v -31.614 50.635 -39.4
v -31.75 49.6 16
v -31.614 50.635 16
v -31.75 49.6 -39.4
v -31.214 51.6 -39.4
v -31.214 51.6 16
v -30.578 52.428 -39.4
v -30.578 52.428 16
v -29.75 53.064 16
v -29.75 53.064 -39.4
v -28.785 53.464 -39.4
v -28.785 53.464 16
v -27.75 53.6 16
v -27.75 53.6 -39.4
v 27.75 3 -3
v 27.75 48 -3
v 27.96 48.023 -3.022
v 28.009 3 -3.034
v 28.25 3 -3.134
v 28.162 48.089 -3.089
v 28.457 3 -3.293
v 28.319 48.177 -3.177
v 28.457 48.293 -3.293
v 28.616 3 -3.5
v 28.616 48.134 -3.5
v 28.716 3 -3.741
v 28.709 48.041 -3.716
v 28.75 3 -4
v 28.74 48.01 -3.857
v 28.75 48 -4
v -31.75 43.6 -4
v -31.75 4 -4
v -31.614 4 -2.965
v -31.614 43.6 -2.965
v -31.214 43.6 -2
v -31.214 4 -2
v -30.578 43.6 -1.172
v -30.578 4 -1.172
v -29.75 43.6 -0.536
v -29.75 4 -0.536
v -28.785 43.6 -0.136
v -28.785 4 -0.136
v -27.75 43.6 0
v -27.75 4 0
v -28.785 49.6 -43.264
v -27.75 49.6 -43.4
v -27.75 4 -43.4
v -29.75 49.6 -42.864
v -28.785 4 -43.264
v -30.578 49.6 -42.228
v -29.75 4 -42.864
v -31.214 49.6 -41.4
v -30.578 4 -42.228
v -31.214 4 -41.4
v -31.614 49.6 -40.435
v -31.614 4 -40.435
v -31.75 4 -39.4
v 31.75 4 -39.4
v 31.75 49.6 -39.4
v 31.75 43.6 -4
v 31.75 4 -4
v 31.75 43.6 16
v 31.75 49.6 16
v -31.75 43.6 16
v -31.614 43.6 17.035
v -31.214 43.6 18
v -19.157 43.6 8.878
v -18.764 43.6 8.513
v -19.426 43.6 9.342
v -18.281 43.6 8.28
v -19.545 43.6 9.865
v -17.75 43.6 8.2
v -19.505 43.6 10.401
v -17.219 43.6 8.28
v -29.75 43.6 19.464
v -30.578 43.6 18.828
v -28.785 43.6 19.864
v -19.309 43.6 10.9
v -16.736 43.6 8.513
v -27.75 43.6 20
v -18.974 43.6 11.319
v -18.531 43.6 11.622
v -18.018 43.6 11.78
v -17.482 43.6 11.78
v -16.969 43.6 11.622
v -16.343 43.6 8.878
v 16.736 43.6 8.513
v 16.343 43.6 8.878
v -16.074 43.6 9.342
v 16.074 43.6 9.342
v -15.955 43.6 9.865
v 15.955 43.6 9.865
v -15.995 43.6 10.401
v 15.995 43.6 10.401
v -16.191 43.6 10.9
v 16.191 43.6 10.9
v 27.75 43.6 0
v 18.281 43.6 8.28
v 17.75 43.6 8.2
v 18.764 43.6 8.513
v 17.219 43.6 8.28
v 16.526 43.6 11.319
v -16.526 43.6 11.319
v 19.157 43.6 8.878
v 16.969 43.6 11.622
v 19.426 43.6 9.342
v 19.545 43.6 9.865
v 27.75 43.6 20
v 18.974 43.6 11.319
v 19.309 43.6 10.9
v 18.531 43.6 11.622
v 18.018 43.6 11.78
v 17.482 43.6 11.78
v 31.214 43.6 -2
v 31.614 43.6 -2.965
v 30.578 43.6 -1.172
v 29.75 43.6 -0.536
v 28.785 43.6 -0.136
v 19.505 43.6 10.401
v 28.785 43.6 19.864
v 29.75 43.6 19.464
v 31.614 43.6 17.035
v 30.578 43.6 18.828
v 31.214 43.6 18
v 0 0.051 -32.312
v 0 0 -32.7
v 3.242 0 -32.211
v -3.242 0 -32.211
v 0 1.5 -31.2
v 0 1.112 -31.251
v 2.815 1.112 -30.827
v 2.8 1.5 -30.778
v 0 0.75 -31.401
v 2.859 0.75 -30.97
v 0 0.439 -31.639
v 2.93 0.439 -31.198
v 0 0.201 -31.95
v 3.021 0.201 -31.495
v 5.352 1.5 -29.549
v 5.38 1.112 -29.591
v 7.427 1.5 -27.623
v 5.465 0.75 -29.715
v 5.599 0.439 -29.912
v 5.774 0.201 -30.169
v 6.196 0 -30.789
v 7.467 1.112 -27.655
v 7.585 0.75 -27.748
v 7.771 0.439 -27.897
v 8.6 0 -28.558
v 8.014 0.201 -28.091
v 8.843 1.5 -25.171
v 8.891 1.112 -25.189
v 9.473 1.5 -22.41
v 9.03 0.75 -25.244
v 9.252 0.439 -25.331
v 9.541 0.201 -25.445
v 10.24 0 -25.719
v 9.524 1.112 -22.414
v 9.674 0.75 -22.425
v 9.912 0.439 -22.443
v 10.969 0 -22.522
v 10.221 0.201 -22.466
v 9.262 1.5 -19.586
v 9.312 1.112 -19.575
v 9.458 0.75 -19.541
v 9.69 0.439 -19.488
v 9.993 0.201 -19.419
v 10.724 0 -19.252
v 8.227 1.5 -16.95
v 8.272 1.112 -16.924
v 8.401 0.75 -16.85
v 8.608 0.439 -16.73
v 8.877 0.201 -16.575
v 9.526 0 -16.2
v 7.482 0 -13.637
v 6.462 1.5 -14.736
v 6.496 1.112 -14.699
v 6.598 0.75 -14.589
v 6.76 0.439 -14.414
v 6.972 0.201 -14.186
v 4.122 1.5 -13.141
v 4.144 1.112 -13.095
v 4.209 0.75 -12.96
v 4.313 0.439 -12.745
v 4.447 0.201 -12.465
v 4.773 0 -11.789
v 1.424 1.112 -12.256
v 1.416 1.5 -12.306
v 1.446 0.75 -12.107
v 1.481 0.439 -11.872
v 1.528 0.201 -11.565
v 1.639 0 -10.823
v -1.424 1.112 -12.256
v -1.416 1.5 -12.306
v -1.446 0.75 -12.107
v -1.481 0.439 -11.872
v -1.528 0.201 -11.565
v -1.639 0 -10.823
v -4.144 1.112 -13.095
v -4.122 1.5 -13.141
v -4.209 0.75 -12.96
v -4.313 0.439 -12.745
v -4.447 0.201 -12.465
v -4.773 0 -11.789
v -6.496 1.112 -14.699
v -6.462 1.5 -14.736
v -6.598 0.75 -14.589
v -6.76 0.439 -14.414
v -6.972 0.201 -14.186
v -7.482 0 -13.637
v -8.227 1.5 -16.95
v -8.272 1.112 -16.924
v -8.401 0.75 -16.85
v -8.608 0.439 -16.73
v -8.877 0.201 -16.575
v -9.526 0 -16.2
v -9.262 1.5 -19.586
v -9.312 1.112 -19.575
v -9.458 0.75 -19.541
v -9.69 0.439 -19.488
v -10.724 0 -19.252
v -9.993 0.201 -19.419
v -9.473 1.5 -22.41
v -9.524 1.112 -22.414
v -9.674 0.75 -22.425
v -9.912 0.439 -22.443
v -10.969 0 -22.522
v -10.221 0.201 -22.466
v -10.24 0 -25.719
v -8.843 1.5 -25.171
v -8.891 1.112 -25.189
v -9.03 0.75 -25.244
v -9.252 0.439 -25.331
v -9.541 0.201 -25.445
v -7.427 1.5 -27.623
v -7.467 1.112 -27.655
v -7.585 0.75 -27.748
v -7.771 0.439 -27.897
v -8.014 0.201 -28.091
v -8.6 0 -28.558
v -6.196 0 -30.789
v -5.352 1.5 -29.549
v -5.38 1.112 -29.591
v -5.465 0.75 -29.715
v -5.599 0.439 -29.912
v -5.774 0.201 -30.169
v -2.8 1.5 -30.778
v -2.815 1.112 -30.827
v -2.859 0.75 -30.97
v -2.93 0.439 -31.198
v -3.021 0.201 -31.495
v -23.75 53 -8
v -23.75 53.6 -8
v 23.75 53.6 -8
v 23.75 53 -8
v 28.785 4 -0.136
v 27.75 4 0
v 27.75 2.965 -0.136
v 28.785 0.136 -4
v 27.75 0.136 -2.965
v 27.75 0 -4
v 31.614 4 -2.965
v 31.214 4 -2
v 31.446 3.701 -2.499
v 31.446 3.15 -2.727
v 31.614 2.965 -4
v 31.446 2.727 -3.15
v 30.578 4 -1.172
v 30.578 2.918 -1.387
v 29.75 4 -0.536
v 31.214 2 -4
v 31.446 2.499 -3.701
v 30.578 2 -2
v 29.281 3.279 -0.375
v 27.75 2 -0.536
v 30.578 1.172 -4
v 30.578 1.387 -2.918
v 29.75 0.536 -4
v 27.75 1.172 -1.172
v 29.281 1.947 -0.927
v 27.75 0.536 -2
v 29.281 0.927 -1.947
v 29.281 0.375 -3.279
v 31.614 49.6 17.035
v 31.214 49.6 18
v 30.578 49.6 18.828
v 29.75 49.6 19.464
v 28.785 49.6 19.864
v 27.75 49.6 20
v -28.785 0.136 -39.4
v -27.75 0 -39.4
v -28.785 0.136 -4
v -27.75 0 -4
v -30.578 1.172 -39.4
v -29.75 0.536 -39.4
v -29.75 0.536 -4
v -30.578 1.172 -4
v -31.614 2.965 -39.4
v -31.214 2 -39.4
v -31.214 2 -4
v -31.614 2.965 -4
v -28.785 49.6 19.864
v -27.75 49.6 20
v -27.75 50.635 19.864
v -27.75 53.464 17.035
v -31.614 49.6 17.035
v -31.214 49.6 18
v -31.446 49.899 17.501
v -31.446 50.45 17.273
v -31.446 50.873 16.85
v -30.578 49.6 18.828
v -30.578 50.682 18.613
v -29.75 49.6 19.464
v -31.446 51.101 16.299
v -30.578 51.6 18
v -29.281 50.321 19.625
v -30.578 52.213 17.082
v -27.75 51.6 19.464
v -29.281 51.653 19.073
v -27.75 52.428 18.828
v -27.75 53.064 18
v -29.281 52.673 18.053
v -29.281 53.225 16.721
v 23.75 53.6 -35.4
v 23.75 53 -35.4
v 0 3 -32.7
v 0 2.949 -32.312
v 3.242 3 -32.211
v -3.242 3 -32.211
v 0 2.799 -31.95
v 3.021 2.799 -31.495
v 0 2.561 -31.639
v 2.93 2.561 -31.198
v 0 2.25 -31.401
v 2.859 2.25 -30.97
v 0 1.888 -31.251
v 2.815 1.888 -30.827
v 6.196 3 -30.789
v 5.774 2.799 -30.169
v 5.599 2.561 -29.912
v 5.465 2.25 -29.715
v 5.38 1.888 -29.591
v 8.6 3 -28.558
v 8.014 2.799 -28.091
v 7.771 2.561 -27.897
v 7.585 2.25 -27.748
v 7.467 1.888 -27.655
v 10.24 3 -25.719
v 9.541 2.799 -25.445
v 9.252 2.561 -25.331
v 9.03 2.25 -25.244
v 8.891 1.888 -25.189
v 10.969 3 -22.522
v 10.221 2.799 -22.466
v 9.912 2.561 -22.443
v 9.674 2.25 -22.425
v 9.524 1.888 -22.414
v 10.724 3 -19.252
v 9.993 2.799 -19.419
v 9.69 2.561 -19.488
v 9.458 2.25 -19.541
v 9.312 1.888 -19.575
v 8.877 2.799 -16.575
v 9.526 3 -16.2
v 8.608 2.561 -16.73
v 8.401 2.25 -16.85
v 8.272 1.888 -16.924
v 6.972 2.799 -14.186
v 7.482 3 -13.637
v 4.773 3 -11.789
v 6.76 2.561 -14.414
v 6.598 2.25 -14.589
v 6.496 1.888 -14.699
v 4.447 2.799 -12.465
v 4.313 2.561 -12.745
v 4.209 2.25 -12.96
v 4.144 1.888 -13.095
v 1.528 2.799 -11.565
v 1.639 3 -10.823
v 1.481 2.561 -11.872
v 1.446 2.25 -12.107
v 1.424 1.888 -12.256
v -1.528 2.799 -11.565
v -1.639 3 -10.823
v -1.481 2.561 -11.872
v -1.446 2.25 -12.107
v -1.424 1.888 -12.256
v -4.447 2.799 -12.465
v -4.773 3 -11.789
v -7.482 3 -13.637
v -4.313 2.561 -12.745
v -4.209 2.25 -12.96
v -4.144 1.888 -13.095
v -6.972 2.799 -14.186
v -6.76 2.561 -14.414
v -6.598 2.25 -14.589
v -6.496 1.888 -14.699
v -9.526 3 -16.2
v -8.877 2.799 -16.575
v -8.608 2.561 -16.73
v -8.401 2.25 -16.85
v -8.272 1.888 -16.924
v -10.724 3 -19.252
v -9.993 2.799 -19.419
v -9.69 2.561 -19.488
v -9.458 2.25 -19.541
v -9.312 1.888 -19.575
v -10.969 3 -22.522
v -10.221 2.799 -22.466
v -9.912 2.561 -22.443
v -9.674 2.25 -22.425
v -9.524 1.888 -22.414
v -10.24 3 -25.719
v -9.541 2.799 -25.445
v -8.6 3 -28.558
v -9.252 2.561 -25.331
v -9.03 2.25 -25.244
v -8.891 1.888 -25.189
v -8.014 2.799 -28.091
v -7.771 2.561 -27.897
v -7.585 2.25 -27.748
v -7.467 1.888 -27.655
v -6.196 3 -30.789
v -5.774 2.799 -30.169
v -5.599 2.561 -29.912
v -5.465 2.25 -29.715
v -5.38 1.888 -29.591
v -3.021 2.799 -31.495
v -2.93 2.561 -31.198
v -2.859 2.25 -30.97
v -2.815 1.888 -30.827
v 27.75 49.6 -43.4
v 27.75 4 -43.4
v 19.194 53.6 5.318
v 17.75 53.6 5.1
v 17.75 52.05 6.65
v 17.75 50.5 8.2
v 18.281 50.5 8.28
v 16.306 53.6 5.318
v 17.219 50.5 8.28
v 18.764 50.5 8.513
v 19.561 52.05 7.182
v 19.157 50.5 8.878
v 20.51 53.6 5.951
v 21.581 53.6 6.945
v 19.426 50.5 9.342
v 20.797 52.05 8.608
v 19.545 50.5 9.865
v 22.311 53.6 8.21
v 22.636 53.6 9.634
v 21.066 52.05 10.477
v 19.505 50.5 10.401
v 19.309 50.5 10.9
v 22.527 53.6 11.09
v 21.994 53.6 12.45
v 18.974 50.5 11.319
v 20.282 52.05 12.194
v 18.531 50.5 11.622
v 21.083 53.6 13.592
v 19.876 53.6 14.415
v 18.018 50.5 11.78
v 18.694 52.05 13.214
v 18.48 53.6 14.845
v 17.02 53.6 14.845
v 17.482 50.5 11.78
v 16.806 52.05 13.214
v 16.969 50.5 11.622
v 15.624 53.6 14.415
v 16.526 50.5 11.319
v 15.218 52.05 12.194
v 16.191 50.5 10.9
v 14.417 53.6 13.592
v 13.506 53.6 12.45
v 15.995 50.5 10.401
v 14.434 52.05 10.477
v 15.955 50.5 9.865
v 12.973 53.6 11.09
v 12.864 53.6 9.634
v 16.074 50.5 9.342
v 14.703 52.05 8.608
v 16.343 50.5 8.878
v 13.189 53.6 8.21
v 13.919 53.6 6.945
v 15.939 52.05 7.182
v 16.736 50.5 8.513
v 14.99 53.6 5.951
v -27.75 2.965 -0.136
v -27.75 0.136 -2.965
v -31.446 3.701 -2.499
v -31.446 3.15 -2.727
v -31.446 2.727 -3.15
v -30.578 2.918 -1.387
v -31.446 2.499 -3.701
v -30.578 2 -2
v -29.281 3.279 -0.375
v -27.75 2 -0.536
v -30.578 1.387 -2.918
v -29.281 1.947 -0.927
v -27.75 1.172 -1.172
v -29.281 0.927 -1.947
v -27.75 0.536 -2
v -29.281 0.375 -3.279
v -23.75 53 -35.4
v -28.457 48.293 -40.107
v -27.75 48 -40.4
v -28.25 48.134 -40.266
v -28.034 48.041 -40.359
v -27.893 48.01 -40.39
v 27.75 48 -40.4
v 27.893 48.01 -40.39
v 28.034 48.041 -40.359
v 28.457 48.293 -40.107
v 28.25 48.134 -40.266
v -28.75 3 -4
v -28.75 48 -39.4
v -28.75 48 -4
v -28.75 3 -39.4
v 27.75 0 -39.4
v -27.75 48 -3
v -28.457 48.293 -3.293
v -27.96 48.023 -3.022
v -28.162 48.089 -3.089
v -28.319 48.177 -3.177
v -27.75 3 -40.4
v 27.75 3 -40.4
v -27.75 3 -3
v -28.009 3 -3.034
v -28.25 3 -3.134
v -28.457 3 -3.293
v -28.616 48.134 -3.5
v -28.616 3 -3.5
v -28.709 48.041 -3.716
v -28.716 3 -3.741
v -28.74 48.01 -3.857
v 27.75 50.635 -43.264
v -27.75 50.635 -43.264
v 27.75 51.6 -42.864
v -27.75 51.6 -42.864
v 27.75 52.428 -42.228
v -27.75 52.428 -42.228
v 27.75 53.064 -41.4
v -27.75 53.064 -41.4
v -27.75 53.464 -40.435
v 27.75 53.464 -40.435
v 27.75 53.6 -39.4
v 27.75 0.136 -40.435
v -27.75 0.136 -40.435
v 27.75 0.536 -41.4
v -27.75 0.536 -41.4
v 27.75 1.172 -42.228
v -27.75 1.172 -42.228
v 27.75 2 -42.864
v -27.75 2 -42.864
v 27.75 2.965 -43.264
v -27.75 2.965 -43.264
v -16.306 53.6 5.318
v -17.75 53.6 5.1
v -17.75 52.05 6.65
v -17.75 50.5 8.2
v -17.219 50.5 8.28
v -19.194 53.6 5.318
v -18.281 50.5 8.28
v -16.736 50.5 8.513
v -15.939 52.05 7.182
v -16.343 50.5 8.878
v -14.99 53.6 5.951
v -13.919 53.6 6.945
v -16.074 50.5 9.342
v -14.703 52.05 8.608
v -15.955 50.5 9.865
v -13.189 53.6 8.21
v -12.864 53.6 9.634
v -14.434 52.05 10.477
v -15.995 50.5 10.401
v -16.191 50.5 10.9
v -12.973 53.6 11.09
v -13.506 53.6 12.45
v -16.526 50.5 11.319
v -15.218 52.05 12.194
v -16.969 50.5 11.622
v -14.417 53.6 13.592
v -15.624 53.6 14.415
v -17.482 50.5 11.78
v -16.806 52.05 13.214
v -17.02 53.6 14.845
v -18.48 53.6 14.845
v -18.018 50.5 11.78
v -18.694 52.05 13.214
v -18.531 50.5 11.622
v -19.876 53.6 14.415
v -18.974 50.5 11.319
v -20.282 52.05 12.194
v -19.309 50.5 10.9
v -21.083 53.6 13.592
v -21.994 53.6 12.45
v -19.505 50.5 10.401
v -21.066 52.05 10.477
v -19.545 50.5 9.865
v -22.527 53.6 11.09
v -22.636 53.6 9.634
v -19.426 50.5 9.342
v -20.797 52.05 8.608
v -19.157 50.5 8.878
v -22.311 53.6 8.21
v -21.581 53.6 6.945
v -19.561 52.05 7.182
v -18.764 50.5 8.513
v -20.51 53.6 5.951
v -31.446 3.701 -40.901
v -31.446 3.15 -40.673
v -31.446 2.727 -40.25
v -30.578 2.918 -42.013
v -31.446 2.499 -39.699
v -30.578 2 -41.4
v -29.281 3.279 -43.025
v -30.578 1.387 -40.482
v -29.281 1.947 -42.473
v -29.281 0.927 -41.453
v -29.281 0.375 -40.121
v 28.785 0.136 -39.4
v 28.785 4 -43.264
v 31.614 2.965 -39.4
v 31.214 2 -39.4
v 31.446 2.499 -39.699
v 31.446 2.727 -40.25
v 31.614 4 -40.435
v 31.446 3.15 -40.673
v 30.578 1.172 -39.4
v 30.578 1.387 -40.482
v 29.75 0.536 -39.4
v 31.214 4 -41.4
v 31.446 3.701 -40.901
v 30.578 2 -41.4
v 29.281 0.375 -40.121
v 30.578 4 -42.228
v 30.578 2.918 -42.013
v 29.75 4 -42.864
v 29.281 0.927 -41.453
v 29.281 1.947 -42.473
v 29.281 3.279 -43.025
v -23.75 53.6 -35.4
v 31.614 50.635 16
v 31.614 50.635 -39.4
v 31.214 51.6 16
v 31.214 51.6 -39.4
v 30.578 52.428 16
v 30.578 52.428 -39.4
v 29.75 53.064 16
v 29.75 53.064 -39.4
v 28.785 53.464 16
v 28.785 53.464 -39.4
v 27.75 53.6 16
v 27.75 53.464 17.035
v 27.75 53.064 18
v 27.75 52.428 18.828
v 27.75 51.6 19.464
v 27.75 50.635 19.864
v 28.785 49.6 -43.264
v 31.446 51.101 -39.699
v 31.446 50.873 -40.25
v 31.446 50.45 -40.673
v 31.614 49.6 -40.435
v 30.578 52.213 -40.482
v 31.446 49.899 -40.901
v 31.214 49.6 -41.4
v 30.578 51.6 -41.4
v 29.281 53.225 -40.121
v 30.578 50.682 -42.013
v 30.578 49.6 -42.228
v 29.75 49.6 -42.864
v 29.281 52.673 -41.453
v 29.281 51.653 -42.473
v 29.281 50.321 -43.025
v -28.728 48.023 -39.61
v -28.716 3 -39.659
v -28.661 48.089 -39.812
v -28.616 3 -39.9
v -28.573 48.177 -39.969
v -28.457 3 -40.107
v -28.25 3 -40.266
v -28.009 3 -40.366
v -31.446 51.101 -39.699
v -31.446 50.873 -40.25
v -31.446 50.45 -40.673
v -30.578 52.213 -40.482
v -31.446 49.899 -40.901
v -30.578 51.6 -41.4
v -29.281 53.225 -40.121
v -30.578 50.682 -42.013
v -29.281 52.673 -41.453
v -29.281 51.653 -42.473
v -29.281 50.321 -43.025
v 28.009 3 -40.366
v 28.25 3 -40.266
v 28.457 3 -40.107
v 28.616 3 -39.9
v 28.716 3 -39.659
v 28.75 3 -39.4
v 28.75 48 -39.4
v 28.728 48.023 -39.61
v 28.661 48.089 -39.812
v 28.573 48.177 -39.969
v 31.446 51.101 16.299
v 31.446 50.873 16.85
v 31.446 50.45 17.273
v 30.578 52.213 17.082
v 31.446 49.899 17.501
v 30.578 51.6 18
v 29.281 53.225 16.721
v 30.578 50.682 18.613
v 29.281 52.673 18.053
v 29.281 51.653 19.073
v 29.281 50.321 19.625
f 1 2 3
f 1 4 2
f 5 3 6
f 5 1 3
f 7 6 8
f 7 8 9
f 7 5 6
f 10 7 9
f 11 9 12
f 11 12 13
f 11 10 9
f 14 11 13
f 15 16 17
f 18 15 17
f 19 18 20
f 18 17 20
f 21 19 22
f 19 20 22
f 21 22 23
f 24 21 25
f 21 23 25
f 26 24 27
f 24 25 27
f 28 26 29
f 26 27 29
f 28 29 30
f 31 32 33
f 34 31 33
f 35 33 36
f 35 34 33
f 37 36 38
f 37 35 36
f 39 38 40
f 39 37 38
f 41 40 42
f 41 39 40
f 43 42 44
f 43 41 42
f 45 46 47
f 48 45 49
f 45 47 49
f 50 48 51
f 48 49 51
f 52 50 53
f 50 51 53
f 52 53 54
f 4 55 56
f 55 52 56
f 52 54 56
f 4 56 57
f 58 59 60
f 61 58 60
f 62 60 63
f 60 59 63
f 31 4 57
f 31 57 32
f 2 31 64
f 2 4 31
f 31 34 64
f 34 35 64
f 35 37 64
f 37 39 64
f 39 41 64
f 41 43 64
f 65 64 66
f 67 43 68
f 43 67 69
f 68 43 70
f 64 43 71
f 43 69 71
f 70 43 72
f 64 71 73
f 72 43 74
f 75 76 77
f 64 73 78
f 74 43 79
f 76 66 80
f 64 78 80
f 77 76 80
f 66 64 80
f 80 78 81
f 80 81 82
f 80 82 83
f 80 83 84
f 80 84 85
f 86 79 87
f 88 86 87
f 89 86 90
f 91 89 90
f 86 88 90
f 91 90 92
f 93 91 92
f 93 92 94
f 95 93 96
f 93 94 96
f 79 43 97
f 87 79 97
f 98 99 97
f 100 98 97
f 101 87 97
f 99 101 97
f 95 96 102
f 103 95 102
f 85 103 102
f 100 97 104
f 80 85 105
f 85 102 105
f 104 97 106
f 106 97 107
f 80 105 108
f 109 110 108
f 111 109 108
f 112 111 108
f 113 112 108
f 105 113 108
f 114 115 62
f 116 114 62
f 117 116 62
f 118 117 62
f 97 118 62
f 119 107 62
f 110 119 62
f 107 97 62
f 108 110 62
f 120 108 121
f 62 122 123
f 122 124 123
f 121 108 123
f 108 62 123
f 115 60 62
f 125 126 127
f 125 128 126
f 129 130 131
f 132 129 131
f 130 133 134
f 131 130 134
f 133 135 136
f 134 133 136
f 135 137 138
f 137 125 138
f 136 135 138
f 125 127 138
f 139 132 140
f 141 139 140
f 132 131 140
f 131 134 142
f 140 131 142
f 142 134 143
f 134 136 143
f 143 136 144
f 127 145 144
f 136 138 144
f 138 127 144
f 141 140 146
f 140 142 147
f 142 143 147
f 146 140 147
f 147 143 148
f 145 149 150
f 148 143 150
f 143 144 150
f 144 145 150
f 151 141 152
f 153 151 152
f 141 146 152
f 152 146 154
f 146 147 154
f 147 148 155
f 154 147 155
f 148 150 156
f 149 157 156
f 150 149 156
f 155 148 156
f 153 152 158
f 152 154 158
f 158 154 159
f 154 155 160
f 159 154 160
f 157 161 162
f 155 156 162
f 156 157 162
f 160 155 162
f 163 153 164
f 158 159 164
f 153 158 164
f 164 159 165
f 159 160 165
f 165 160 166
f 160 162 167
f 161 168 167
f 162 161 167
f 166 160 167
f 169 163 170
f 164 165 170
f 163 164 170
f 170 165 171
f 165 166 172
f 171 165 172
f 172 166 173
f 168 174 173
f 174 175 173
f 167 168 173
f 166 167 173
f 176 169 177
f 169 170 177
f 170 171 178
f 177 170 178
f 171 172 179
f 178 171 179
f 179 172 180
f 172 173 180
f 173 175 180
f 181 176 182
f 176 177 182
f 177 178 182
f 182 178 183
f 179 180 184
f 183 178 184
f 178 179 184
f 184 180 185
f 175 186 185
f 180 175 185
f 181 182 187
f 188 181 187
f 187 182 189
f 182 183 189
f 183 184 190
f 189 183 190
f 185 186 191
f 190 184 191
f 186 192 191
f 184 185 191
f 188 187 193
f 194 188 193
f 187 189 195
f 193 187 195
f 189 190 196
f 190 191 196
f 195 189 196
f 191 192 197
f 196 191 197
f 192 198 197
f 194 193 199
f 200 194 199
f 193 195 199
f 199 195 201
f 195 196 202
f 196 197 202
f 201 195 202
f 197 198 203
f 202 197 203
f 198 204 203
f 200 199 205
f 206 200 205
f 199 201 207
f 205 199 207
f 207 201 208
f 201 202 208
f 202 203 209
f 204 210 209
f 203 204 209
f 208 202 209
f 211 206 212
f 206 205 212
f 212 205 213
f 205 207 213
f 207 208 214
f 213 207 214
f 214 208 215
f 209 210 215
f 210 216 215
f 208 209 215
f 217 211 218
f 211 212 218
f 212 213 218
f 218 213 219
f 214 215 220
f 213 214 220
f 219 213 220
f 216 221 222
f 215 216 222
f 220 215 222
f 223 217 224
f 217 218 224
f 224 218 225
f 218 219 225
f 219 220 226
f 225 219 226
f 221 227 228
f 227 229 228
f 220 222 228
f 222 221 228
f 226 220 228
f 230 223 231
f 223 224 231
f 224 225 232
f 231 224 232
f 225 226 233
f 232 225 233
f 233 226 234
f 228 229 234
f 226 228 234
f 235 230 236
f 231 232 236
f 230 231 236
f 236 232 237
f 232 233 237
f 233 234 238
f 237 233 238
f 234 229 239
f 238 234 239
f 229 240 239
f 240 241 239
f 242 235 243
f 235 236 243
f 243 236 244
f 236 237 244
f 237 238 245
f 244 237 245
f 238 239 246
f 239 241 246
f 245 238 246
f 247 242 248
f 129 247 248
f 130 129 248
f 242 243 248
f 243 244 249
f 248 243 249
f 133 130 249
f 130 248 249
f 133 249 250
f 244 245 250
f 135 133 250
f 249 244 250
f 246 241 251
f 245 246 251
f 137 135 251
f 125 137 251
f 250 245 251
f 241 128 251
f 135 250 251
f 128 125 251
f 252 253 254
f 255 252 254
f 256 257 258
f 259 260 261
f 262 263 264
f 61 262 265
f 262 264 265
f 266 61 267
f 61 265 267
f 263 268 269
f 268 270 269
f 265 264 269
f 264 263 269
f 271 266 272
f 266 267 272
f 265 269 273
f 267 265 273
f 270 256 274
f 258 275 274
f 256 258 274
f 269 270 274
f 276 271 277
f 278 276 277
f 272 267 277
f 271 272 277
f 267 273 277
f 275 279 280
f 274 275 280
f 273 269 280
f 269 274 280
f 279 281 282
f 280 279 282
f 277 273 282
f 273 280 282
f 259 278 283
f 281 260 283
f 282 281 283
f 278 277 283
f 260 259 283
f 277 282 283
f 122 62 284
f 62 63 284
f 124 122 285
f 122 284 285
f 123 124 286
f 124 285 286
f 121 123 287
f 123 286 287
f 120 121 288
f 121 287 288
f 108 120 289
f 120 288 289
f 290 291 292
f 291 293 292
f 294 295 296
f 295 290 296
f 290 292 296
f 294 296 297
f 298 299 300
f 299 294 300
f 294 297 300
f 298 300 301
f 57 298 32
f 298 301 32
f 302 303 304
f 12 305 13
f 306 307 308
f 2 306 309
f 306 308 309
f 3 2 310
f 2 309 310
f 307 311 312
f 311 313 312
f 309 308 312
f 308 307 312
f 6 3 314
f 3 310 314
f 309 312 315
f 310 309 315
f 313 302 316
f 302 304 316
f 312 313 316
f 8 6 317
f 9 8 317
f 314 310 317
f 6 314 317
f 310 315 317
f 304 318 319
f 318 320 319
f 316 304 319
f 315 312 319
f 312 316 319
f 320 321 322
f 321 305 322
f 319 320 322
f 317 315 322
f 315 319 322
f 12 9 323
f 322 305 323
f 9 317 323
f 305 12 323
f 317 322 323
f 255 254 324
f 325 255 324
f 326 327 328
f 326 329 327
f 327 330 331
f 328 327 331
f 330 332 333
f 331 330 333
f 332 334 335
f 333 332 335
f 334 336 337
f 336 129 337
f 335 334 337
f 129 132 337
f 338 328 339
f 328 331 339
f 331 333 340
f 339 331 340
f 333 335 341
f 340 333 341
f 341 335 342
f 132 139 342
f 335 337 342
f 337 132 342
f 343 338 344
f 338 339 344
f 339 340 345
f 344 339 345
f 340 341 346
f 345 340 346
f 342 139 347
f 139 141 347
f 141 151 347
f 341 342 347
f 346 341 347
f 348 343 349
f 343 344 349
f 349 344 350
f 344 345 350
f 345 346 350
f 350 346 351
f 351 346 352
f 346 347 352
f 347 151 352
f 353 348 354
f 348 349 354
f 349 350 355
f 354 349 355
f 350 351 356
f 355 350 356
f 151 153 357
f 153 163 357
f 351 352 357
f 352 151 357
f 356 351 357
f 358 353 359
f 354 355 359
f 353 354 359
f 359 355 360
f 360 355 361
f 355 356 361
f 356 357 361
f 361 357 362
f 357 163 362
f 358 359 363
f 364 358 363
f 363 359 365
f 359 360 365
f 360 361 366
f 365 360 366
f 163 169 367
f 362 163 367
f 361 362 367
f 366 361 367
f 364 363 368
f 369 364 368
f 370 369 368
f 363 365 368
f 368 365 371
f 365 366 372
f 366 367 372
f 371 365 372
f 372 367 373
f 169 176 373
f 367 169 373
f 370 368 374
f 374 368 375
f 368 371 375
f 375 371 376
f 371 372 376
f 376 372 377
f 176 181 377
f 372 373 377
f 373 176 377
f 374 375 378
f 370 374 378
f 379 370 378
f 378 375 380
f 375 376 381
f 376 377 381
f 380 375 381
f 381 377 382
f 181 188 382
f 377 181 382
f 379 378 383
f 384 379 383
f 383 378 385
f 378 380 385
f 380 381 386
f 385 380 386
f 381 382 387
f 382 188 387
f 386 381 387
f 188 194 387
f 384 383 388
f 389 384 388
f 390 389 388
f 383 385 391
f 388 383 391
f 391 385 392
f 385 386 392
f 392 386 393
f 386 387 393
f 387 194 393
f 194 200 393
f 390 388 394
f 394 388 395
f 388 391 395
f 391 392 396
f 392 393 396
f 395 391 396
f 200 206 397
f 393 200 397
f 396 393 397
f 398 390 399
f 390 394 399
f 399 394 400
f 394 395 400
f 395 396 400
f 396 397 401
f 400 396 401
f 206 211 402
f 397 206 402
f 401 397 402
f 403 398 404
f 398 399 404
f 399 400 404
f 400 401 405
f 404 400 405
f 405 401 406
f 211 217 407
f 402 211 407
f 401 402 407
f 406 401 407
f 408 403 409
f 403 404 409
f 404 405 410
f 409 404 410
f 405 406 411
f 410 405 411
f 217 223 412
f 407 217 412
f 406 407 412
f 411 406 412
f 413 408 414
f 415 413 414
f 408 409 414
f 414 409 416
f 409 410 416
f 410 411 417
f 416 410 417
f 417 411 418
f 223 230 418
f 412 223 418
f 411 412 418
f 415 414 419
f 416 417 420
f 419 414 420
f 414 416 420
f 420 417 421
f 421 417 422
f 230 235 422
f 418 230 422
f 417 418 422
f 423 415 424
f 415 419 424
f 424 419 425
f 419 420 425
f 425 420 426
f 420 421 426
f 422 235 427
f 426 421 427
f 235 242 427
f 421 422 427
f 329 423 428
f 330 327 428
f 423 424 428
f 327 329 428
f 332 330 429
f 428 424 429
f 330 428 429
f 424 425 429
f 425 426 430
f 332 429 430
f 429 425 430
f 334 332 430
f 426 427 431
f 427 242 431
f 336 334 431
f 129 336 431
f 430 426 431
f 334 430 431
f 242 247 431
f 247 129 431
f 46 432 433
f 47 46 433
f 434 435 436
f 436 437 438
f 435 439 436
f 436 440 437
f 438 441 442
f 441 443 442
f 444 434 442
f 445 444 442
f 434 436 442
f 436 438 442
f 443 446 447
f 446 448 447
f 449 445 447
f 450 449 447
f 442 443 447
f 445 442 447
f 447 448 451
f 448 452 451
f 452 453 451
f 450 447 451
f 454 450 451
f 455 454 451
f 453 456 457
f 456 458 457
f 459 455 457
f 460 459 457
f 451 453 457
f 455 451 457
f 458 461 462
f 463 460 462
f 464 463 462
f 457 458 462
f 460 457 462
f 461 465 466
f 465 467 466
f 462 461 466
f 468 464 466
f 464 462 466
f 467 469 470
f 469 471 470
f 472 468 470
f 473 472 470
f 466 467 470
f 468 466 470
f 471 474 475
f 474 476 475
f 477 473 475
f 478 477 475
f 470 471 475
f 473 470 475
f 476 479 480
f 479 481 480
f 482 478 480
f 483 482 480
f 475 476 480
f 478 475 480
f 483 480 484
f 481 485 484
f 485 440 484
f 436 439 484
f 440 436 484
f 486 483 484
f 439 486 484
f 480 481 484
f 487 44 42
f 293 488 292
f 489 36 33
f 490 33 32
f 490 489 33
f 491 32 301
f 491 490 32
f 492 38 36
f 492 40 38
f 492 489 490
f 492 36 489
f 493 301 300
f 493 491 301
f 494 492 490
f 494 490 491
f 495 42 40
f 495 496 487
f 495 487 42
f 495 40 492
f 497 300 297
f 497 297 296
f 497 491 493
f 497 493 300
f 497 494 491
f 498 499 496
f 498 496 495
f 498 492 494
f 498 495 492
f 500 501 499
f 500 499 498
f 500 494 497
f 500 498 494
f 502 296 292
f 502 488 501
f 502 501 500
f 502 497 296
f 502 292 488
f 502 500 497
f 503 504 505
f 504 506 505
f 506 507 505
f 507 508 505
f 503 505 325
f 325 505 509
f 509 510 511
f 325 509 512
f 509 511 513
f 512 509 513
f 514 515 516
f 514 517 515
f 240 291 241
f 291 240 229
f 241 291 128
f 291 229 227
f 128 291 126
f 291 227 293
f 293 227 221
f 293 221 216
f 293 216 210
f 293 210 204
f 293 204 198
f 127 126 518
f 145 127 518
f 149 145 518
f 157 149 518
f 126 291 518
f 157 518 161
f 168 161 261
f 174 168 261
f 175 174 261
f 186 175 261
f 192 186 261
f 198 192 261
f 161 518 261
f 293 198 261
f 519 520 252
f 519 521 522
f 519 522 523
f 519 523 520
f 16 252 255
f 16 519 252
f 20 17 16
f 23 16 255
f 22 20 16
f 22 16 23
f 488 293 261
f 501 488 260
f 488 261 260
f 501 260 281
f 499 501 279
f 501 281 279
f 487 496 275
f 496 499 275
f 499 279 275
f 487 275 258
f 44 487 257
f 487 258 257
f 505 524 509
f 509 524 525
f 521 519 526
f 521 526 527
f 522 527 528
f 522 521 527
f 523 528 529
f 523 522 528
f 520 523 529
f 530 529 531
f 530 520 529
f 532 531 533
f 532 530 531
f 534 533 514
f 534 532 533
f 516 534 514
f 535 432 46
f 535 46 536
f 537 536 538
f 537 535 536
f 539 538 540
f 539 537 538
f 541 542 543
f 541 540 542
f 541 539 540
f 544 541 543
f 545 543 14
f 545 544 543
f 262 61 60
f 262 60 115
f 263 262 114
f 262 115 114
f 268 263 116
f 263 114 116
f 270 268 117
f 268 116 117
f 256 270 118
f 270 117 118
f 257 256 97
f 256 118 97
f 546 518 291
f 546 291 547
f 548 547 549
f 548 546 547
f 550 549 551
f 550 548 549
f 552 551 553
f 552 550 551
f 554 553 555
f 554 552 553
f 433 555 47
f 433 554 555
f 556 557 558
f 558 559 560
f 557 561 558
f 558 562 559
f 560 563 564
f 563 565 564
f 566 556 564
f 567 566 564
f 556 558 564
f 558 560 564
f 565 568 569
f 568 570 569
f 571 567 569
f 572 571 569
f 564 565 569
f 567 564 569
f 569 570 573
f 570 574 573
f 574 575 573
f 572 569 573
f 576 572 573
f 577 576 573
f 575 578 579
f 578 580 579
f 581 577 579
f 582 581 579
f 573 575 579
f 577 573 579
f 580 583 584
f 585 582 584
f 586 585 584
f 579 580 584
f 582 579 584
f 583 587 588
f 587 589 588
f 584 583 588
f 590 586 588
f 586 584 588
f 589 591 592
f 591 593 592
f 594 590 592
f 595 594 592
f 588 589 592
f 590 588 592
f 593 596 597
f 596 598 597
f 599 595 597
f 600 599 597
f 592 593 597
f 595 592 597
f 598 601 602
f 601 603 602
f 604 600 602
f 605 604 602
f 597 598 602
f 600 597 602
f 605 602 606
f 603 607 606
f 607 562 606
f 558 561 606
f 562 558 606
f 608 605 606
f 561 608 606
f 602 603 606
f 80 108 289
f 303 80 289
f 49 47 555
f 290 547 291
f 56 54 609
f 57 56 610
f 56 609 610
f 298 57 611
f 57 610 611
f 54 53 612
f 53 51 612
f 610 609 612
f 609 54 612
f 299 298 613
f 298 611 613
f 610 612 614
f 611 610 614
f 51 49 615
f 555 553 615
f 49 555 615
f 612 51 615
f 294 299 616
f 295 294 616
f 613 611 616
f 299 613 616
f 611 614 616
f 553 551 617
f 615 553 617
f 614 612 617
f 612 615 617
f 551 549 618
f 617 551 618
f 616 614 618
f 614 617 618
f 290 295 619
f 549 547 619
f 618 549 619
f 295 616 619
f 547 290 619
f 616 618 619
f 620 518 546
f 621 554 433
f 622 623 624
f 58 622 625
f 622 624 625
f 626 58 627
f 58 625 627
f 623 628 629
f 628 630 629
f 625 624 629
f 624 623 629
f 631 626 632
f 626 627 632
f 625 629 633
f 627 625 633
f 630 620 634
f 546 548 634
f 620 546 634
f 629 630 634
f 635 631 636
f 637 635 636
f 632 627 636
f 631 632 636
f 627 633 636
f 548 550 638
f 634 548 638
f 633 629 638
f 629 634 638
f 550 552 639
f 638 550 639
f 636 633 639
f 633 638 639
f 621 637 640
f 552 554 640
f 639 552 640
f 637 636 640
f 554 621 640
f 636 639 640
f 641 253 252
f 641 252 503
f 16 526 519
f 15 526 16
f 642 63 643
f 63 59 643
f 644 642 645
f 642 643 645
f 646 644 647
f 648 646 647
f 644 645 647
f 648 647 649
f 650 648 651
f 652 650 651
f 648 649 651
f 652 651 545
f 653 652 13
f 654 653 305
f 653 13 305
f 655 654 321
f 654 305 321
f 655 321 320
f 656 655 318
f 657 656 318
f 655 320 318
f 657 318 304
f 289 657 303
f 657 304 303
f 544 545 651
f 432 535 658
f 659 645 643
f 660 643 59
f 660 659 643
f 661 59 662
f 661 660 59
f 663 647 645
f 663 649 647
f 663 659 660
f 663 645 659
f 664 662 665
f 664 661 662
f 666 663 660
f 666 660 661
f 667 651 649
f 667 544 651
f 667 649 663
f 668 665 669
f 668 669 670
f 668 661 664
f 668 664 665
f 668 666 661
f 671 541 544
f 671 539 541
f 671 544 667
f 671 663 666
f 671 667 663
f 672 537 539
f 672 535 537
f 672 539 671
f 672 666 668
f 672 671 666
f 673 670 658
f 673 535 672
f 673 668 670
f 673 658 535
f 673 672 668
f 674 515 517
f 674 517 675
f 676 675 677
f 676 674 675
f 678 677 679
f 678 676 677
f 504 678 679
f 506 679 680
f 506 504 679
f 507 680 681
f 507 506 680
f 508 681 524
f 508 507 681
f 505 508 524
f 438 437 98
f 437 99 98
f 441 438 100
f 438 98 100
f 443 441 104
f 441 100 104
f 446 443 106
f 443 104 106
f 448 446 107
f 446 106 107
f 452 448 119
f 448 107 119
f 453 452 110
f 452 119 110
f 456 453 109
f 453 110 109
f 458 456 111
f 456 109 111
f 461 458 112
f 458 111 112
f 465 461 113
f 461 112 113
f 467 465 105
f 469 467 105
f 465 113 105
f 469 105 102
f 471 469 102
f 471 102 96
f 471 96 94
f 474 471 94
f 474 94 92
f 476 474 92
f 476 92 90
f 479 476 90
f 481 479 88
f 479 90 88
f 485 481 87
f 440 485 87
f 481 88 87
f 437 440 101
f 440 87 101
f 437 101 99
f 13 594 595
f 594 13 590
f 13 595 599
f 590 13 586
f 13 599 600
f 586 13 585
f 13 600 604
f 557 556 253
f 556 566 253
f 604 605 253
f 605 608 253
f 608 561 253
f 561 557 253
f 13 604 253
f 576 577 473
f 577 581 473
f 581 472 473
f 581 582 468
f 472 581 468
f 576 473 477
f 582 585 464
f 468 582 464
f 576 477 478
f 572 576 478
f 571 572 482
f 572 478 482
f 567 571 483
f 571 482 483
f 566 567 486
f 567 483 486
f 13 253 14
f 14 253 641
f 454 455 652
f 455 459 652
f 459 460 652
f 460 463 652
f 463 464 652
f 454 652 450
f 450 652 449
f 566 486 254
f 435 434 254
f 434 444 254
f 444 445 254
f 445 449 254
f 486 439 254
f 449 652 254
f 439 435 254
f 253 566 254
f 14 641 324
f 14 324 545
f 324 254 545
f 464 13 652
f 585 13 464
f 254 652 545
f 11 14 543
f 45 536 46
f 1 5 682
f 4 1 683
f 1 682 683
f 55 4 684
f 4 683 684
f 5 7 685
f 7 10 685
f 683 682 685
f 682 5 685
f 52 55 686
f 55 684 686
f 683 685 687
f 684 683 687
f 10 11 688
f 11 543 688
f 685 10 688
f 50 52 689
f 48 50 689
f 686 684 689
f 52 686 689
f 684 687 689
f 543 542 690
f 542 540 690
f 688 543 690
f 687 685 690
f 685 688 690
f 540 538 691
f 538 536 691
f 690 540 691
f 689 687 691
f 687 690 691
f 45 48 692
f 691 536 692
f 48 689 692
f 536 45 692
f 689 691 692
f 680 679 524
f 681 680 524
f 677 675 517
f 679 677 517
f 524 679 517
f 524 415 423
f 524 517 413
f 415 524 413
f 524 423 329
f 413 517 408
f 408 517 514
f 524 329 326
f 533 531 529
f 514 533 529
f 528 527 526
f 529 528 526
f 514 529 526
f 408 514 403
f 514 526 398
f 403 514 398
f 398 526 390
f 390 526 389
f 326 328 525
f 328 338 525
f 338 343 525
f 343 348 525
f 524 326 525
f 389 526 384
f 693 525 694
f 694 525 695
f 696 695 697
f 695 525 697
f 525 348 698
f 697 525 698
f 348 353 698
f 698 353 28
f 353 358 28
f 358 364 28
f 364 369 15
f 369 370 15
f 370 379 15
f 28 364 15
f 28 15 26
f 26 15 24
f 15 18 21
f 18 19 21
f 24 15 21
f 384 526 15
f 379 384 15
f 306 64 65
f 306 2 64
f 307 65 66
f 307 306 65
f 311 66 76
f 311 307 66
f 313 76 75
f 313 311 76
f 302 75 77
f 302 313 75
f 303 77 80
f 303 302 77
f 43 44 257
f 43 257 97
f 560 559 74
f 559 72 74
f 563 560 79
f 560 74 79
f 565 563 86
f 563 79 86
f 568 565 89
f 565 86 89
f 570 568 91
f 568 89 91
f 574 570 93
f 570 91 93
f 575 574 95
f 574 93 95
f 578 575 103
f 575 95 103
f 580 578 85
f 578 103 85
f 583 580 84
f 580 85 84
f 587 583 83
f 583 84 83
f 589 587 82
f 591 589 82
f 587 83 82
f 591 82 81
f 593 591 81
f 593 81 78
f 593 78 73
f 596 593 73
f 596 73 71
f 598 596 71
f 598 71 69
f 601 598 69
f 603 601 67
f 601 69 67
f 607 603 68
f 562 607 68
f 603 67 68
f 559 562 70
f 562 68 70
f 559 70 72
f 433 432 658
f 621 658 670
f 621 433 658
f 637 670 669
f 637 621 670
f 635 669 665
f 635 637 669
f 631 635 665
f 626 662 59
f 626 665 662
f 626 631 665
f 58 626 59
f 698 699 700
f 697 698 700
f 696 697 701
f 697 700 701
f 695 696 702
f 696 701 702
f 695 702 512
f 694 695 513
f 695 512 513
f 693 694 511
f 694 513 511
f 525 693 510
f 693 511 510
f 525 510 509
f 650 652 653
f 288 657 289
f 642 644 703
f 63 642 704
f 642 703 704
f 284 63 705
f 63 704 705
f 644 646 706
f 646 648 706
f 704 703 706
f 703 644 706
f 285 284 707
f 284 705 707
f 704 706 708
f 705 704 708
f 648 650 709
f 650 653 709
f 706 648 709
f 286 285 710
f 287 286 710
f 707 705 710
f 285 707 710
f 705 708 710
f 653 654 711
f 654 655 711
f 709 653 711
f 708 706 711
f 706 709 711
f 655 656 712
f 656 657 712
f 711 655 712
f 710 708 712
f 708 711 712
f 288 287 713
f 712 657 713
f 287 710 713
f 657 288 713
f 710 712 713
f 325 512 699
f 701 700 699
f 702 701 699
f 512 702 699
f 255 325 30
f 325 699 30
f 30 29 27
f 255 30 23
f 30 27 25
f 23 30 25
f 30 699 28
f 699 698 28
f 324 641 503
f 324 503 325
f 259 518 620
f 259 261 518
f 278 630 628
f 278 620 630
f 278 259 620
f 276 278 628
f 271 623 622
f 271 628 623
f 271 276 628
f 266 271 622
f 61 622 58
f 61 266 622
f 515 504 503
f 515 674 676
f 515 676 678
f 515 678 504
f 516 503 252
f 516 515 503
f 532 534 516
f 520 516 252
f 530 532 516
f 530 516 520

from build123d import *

# Parameters (mm, degrees)
PROFILE_EXTRUDE_DEPTH                           = 31.75
INTERIOR_START                                  = -3
INTERIOR_SKETCH_W                               = 57.5
INTERIOR_SKETCH_H                               = 37.4
INTERIOR_CUT_DEPTH                              = 50
OPENING_CUT_REACH                               = 77.925
OPENING_SKETCH_W                                = 47.5
OPENING_SKETCH_H                                = 27.4
CHAMFER1_SIZE                                   = 5
FILLET1_R                                       = 1
CUT_EXTRUDE3_REACH                              = 77.925
SKETCH5_R                                       = 9.5
FILLET2_R                                       = 1.5
FILLET3_R                                       = 4
CSK_FOR_M3_FLAT_HEAD_MACHINE_SCREW1_D           = 3.6
CSK_FOR_M3_FLAT_HEAD_MACHINE_SCREW1_CSINK_D     = 9.8
CSK_FOR_M3_FLAT_HEAD_MACHINE_SCREW1_CSINK_ANGLE = 90


with BuildPart() as part:
    # Profile Sketch → Profile Extrude (new, symmetric)
    with BuildSketch(Plane(origin=(0, 0, 0), x_dir=(0, 0, -1), z_dir=(1, 0, 0))):
        Polygon((0, 0), (0, 43.6), (-20, 43.6), (-20, 53.6), (43.4, 53.6), (43.4, 0), align=None)
    extrude(amount=PROFILE_EXTRUDE_DEPTH, both=True)

    # Interior Sketch → Interior Cut (cut)
    with BuildSketch(Plane.XZ.offset(INTERIOR_START)):
        with Locations((0, -21.7)):
            Rectangle(INTERIOR_SKETCH_W, INTERIOR_SKETCH_H)
    extrude(amount=-INTERIOR_CUT_DEPTH, mode=Mode.SUBTRACT)

    # Opening Sketch → Opening Cut (cut, up to next)
    with BuildSketch(Plane(origin=(0, 53.6, 0), x_dir=(1, 0, 0), z_dir=(0, 1, 0)), mode=Mode.PRIVATE) as opening_cut_sk1:
        with Locations((0, 21.7)):
            Rectangle(OPENING_SKETCH_W, OPENING_SKETCH_H)
    opening_cut_tool1 = extrude(opening_cut_sk1.sketch, amount=-OPENING_CUT_REACH, mode=Mode.PRIVATE) & part.part
    add(opening_cut_tool1.solids().sort_by_distance((0, 53.6, -21.7))[0], mode=Mode.SUBTRACT)

    # Chamfer1
    chamfer1_edges = [part.edges().sort_by_distance(p)[0] for p in [
        (0, 53, -3),
        (28.75, 53, -21.7),
        (0, 53, -40.4),
        (-28.75, 53, -21.7),
    ]]
    chamfer(chamfer1_edges, length=CHAMFER1_SIZE - 0.0001)  # a hair under: the kernel refuses the full size

    # Fillet1
    fillet1_edges = [part.edges().sort_by_distance(p)[0] for p in [
        (28.75, 25.50005, -40.4),
        (28.75, 25.50005, -3),
        (-28.75, 25.50005, -40.4),
        (-28.75, 25.50005, -3),
    ]]
    fillet(fillet1_edges, radius=FILLET1_R)

    # Sketch5 → Cut-Extrude3 (cut, up to next)
    with BuildSketch(Plane.XZ, mode=Mode.PRIVATE) as cut_extrude3_sk1:
        with Locations(Location((0, -21.7, 0), (0, 0, 270))):
            Circle(SKETCH5_R)
    cut_extrude3_tool1 = extrude(cut_extrude3_sk1.sketch, amount=-CUT_EXTRUDE3_REACH, mode=Mode.PRIVATE) & part.part
    add(cut_extrude3_tool1.solids().sort_by_distance((0, 0, -21.7))[0], mode=Mode.SUBTRACT)

    # Fillet2
    fillet2_edges = [part.edges().sort_by_distance(p)[0] for p in [
        (0, 0, -12.2),
        (0, 3, -12.2),
    ]]
    fillet(fillet2_edges, radius=FILLET2_R - 0.0001)  # a hair under: the kernel refuses the full size

    # Fillet3
    fillet3_edges = [part.edges().sort_by_distance(p)[0] for p in [
        (0, 0, 0),
        (0, 53.6, 20),
        (0, 53.6, -43.4),
        (0, 0, -43.4),
        (31.75, 53.6, -11.7),
        (31.75, 48.6, 20),
        (31.75, 21.8, 0),
        (31.75, 0, -21.7),
        (-31.75, 21.8, 0),
        (-31.75, 48.6, 20),
        (-31.75, 53.6, -11.7),
        (-31.75, 26.8, -43.4),
        (-31.75, 0, -21.7),
        (31.75, 26.8, -43.4),
    ]]
    fillet(fillet3_edges, radius=FILLET3_R)

    # CSK for M3 Flat Head Machine Screw1 (through all)
    with Locations(Plane(origin=(-17.75, 53.6, 10), x_dir=(0, 0, 1), z_dir=(0, 1, 0))):
        with Locations((0, 0), (0, 35.5)):
            CounterSinkHole(CSK_FOR_M3_FLAT_HEAD_MACHINE_SCREW1_D / 2, CSK_FOR_M3_FLAT_HEAD_MACHINE_SCREW1_CSINK_D / 2, counter_sink_angle=CSK_FOR_M3_FLAT_HEAD_MACHINE_SCREW1_CSINK_ANGLE)


solid = part.part
